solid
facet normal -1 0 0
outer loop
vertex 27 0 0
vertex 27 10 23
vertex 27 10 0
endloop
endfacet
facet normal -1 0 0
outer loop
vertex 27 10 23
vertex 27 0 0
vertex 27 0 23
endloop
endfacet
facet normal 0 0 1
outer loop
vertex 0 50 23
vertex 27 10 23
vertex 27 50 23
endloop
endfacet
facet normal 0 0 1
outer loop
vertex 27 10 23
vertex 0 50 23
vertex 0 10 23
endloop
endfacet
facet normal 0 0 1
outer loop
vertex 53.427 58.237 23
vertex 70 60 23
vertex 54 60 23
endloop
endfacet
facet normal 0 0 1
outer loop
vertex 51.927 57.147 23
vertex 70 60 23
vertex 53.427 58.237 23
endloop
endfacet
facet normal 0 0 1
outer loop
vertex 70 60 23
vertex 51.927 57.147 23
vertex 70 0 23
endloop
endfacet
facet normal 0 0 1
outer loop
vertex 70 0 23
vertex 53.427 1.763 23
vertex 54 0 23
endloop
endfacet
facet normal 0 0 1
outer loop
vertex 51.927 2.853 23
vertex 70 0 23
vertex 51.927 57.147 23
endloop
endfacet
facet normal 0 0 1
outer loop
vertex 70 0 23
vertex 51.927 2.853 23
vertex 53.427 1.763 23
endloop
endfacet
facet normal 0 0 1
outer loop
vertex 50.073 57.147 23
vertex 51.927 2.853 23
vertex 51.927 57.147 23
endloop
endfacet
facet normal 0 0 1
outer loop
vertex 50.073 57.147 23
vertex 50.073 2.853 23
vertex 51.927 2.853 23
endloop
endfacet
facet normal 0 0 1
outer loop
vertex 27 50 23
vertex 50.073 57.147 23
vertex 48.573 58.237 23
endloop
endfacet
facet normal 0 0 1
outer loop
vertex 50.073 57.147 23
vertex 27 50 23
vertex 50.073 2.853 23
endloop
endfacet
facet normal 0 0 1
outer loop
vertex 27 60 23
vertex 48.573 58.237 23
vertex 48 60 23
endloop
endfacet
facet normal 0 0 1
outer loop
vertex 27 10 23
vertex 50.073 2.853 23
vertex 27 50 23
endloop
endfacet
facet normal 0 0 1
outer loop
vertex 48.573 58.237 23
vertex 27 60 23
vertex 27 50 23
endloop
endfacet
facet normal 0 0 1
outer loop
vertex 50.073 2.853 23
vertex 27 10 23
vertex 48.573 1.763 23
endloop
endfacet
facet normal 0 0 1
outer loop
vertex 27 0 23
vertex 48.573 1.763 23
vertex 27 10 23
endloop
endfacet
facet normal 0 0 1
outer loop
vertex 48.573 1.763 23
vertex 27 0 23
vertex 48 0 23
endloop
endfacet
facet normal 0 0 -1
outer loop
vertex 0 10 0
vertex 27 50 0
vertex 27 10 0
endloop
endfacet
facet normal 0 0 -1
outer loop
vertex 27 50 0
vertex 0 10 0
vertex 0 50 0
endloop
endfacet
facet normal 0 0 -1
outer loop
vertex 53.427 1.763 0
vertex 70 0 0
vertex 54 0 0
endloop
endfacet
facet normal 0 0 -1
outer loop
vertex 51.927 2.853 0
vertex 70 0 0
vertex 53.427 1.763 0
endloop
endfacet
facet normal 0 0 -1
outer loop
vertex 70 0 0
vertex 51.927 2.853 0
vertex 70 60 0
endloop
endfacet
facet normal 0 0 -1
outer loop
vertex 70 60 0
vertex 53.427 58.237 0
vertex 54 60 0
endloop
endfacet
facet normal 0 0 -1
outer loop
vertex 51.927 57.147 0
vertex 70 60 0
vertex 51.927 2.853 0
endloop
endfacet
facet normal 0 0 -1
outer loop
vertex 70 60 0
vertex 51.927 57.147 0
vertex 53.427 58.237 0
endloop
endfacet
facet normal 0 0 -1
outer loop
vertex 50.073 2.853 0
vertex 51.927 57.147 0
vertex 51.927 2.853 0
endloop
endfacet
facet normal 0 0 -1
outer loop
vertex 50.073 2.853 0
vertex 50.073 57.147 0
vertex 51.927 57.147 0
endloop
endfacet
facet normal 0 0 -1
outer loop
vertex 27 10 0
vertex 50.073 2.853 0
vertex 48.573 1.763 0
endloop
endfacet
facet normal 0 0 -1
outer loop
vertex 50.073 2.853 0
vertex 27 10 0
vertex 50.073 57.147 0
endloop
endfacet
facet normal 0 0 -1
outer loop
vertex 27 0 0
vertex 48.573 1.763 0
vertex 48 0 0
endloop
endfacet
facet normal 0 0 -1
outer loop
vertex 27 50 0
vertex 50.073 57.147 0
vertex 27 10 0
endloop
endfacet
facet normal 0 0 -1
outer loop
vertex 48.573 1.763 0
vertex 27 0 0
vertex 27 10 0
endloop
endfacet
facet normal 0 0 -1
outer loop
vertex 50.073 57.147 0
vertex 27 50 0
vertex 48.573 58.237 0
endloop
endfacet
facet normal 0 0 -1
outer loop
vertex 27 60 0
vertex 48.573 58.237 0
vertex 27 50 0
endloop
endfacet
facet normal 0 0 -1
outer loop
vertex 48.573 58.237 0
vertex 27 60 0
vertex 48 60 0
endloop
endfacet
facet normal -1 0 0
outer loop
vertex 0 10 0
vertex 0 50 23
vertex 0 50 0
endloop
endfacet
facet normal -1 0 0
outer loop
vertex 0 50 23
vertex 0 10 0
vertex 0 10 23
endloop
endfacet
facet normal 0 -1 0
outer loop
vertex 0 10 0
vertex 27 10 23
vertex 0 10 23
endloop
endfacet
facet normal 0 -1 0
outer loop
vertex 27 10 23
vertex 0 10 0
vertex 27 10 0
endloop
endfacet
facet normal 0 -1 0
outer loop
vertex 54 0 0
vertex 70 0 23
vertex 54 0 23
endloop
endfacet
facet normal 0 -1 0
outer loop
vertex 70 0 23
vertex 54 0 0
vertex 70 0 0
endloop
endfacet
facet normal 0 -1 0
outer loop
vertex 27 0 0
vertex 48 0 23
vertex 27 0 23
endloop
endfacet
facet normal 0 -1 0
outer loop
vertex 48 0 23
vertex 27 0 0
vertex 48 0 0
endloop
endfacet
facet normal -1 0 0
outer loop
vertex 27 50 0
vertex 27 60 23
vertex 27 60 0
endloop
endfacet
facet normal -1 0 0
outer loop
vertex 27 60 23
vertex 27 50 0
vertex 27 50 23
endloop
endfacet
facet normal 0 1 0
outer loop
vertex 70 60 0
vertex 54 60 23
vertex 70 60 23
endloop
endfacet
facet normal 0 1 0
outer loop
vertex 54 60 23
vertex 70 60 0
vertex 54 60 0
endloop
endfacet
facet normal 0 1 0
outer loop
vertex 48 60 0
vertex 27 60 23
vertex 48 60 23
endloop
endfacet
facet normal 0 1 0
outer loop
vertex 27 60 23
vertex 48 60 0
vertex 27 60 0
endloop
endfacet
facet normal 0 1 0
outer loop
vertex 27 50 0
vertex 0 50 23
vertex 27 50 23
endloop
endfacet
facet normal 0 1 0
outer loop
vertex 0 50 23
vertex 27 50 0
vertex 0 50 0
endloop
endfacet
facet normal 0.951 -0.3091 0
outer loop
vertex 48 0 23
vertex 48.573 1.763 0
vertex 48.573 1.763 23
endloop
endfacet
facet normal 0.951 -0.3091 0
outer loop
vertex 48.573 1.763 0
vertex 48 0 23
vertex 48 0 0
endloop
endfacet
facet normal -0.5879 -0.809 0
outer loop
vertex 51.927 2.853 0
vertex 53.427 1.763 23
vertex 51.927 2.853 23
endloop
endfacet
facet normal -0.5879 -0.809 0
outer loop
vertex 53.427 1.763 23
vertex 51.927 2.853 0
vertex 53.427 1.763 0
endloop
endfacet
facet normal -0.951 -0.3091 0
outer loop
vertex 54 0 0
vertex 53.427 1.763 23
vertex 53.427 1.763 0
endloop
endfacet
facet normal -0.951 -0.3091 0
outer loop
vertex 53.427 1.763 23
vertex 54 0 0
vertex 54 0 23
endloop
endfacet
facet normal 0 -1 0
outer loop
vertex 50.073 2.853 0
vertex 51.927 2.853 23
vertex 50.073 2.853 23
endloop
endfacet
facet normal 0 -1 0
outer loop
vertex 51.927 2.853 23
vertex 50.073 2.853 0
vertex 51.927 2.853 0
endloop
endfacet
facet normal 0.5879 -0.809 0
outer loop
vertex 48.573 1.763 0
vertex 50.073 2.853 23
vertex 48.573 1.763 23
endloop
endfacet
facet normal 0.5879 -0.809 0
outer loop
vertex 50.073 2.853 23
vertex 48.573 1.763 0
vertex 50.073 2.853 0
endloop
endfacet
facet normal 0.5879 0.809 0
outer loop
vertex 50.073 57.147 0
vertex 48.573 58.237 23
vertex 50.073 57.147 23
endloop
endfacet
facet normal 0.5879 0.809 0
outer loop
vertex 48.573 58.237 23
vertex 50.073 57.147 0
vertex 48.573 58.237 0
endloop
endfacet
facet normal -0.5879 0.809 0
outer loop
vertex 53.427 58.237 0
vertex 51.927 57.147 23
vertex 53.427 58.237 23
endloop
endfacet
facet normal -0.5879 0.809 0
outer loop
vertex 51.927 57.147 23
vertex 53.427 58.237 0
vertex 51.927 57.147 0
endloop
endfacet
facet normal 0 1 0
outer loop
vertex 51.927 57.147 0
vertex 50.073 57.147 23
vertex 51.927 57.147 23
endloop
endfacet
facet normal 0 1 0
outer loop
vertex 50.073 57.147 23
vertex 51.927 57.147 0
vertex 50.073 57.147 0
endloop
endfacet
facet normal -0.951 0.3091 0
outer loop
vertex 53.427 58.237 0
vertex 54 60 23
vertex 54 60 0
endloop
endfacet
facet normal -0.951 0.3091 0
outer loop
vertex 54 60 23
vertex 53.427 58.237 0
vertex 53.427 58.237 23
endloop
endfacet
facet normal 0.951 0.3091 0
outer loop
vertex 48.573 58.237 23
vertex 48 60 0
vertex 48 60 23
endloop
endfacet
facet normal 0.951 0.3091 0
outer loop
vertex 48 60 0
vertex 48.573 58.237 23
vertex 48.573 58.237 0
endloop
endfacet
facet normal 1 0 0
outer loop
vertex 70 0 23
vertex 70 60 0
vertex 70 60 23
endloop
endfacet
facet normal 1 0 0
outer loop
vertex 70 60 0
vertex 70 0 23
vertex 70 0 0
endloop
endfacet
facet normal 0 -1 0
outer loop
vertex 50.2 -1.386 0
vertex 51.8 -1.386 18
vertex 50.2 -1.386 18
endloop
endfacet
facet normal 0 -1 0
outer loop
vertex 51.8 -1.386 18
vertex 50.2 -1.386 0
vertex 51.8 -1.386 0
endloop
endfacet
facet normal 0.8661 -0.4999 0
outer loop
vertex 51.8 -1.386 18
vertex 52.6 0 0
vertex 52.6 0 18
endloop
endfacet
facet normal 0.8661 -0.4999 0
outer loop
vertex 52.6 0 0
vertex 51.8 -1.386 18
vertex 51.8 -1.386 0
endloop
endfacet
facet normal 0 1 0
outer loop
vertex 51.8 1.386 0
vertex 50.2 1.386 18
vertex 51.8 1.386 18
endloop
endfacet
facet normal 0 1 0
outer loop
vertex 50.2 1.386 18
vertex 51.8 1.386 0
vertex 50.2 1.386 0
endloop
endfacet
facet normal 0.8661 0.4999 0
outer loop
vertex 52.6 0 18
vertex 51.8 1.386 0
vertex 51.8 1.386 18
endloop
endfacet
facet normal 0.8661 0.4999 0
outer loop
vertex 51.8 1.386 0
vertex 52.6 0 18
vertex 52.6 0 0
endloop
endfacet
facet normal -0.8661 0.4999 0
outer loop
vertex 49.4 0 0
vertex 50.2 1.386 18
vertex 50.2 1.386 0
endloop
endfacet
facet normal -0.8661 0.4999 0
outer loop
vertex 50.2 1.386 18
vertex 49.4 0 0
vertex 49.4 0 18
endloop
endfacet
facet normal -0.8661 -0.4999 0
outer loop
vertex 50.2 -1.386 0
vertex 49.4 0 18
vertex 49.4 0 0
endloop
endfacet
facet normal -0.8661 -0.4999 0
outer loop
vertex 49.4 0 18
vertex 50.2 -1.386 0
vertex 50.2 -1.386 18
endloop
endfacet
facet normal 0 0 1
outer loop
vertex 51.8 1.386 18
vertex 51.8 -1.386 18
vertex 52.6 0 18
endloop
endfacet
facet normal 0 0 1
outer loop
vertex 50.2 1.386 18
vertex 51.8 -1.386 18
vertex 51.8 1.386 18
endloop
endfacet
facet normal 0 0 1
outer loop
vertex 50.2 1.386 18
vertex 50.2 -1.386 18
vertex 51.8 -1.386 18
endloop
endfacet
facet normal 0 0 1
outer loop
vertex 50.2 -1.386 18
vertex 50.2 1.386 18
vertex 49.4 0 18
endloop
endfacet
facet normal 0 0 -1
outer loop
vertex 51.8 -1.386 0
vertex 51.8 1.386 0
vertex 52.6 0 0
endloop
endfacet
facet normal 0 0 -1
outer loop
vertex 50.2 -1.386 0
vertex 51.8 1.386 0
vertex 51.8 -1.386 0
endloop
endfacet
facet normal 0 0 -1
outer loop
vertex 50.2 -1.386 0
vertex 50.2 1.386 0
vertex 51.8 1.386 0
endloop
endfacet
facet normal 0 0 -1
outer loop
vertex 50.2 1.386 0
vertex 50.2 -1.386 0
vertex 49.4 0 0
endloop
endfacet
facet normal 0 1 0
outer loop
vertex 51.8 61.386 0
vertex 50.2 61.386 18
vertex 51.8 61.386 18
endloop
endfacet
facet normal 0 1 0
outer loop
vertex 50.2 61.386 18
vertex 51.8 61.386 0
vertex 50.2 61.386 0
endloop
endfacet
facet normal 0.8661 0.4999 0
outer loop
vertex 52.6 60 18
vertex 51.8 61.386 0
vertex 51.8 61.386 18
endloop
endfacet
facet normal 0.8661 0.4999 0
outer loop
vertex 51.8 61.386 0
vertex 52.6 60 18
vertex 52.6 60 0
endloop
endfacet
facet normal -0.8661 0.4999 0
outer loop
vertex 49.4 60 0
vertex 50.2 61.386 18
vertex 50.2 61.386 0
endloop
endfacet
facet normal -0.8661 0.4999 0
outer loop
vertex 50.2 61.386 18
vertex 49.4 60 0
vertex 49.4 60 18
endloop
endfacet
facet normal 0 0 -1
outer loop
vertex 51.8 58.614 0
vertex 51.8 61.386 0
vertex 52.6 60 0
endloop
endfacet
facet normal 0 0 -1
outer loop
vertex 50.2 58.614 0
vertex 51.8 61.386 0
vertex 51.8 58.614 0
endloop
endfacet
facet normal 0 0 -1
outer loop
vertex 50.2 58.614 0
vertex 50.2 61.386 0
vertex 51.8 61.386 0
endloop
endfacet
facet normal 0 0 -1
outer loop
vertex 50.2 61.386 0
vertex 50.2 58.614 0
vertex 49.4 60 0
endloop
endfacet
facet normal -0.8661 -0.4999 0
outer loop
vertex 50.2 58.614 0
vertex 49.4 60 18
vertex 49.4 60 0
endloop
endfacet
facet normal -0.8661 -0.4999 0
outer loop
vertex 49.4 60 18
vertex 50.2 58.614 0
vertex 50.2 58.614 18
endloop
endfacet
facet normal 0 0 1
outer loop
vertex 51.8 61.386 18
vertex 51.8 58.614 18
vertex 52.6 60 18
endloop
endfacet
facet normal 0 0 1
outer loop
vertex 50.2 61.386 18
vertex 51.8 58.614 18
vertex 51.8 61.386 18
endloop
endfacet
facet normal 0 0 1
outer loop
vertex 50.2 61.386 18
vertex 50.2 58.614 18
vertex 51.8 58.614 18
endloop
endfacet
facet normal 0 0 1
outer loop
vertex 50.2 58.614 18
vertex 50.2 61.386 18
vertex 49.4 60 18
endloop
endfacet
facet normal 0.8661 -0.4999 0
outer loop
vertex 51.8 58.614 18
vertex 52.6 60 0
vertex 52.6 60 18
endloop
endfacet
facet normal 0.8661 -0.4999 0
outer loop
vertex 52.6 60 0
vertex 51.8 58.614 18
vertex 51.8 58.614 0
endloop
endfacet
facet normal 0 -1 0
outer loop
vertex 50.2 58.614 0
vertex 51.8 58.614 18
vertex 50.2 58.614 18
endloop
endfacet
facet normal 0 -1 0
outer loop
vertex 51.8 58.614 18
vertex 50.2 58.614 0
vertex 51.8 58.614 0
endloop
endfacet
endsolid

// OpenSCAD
// file: regular_polygon.scad
module regular_polygon(order = 4, r=1){
     angles=[ for (i = [0:order-1]) i*(360/order) ];
     coords=[ for (th=angles) [r*cos(th), r*sin(th)] ];
     polygon(coords);
}
// main file
use <regular_polygon.scad>;

gearbox_height=23;
gearbox_holes_distance=60;
gearbox_length=70;
gearbox_end_to_shaft = 25;
gearbox_end_to_hole = 19;

/* 23mm = 134 px */
/* = 145 px*/

shaft_total_length = 100;

module gearbox_model() {
  difference(){
  cube([gearbox_length,gearbox_holes_distance,gearbox_height]);
  union(){
    cube([gearbox_length/2,10,gearbox_height]);
    translate([0,gearbox_holes_distance-10,0])cube([gearbox_length/2,10,gearbox_height]);
    translate([gearbox_length-gearbox_end_to_hole, 0,0])cylinder(d=4,h=gearbox_height);
    translate([gearbox_length-gearbox_end_to_hole, gearbox_holes_distance,0])cylinder(d=4,h=gearbox_height);
  }
  }
}

module gearbox_model_xhole() {
  difference(){
  cube([gearbox_length,gearbox_holes_distance,gearbox_height]);
  union(){
    cube([gearbox_length/2-8,10,gearbox_height]);
    translate([0,gearbox_holes_distance-10,0])cube([gearbox_length/2-8,10,gearbox_height]);
    translate([gearbox_length-gearbox_end_to_hole, 0,0])cylinder(d=6,h=gearbox_height);
    translate([gearbox_length-gearbox_end_to_hole, gearbox_holes_distance,0])cylinder(d=6,h=gearbox_height);
  }
  }
  color([1,0,0])translate([gearbox_length-gearbox_end_to_hole, 0,0])cylinder(d=3.2,h=gearbox_height-5);
      translate([gearbox_length-gearbox_end_to_hole, gearbox_holes_distance,0])cylinder(d=3.2,h=gearbox_height-5);
    
}



module gearbox_drive_shaft() {
translate([gearbox_length-gearbox_end_to_shaft,-(shaft_total_length-gearbox_holes_distance)/2,gearbox_height/2])rotate([-90,0,0])linear_extrude(h=shaft_total_length)regular_polygon(order = 6, r=1.7);
}

module full_gearbox_model() {
/* gearbox_model(); */
color([1,0,0])gearbox_drive_shaft();
}
gearbox_model_xhole();
